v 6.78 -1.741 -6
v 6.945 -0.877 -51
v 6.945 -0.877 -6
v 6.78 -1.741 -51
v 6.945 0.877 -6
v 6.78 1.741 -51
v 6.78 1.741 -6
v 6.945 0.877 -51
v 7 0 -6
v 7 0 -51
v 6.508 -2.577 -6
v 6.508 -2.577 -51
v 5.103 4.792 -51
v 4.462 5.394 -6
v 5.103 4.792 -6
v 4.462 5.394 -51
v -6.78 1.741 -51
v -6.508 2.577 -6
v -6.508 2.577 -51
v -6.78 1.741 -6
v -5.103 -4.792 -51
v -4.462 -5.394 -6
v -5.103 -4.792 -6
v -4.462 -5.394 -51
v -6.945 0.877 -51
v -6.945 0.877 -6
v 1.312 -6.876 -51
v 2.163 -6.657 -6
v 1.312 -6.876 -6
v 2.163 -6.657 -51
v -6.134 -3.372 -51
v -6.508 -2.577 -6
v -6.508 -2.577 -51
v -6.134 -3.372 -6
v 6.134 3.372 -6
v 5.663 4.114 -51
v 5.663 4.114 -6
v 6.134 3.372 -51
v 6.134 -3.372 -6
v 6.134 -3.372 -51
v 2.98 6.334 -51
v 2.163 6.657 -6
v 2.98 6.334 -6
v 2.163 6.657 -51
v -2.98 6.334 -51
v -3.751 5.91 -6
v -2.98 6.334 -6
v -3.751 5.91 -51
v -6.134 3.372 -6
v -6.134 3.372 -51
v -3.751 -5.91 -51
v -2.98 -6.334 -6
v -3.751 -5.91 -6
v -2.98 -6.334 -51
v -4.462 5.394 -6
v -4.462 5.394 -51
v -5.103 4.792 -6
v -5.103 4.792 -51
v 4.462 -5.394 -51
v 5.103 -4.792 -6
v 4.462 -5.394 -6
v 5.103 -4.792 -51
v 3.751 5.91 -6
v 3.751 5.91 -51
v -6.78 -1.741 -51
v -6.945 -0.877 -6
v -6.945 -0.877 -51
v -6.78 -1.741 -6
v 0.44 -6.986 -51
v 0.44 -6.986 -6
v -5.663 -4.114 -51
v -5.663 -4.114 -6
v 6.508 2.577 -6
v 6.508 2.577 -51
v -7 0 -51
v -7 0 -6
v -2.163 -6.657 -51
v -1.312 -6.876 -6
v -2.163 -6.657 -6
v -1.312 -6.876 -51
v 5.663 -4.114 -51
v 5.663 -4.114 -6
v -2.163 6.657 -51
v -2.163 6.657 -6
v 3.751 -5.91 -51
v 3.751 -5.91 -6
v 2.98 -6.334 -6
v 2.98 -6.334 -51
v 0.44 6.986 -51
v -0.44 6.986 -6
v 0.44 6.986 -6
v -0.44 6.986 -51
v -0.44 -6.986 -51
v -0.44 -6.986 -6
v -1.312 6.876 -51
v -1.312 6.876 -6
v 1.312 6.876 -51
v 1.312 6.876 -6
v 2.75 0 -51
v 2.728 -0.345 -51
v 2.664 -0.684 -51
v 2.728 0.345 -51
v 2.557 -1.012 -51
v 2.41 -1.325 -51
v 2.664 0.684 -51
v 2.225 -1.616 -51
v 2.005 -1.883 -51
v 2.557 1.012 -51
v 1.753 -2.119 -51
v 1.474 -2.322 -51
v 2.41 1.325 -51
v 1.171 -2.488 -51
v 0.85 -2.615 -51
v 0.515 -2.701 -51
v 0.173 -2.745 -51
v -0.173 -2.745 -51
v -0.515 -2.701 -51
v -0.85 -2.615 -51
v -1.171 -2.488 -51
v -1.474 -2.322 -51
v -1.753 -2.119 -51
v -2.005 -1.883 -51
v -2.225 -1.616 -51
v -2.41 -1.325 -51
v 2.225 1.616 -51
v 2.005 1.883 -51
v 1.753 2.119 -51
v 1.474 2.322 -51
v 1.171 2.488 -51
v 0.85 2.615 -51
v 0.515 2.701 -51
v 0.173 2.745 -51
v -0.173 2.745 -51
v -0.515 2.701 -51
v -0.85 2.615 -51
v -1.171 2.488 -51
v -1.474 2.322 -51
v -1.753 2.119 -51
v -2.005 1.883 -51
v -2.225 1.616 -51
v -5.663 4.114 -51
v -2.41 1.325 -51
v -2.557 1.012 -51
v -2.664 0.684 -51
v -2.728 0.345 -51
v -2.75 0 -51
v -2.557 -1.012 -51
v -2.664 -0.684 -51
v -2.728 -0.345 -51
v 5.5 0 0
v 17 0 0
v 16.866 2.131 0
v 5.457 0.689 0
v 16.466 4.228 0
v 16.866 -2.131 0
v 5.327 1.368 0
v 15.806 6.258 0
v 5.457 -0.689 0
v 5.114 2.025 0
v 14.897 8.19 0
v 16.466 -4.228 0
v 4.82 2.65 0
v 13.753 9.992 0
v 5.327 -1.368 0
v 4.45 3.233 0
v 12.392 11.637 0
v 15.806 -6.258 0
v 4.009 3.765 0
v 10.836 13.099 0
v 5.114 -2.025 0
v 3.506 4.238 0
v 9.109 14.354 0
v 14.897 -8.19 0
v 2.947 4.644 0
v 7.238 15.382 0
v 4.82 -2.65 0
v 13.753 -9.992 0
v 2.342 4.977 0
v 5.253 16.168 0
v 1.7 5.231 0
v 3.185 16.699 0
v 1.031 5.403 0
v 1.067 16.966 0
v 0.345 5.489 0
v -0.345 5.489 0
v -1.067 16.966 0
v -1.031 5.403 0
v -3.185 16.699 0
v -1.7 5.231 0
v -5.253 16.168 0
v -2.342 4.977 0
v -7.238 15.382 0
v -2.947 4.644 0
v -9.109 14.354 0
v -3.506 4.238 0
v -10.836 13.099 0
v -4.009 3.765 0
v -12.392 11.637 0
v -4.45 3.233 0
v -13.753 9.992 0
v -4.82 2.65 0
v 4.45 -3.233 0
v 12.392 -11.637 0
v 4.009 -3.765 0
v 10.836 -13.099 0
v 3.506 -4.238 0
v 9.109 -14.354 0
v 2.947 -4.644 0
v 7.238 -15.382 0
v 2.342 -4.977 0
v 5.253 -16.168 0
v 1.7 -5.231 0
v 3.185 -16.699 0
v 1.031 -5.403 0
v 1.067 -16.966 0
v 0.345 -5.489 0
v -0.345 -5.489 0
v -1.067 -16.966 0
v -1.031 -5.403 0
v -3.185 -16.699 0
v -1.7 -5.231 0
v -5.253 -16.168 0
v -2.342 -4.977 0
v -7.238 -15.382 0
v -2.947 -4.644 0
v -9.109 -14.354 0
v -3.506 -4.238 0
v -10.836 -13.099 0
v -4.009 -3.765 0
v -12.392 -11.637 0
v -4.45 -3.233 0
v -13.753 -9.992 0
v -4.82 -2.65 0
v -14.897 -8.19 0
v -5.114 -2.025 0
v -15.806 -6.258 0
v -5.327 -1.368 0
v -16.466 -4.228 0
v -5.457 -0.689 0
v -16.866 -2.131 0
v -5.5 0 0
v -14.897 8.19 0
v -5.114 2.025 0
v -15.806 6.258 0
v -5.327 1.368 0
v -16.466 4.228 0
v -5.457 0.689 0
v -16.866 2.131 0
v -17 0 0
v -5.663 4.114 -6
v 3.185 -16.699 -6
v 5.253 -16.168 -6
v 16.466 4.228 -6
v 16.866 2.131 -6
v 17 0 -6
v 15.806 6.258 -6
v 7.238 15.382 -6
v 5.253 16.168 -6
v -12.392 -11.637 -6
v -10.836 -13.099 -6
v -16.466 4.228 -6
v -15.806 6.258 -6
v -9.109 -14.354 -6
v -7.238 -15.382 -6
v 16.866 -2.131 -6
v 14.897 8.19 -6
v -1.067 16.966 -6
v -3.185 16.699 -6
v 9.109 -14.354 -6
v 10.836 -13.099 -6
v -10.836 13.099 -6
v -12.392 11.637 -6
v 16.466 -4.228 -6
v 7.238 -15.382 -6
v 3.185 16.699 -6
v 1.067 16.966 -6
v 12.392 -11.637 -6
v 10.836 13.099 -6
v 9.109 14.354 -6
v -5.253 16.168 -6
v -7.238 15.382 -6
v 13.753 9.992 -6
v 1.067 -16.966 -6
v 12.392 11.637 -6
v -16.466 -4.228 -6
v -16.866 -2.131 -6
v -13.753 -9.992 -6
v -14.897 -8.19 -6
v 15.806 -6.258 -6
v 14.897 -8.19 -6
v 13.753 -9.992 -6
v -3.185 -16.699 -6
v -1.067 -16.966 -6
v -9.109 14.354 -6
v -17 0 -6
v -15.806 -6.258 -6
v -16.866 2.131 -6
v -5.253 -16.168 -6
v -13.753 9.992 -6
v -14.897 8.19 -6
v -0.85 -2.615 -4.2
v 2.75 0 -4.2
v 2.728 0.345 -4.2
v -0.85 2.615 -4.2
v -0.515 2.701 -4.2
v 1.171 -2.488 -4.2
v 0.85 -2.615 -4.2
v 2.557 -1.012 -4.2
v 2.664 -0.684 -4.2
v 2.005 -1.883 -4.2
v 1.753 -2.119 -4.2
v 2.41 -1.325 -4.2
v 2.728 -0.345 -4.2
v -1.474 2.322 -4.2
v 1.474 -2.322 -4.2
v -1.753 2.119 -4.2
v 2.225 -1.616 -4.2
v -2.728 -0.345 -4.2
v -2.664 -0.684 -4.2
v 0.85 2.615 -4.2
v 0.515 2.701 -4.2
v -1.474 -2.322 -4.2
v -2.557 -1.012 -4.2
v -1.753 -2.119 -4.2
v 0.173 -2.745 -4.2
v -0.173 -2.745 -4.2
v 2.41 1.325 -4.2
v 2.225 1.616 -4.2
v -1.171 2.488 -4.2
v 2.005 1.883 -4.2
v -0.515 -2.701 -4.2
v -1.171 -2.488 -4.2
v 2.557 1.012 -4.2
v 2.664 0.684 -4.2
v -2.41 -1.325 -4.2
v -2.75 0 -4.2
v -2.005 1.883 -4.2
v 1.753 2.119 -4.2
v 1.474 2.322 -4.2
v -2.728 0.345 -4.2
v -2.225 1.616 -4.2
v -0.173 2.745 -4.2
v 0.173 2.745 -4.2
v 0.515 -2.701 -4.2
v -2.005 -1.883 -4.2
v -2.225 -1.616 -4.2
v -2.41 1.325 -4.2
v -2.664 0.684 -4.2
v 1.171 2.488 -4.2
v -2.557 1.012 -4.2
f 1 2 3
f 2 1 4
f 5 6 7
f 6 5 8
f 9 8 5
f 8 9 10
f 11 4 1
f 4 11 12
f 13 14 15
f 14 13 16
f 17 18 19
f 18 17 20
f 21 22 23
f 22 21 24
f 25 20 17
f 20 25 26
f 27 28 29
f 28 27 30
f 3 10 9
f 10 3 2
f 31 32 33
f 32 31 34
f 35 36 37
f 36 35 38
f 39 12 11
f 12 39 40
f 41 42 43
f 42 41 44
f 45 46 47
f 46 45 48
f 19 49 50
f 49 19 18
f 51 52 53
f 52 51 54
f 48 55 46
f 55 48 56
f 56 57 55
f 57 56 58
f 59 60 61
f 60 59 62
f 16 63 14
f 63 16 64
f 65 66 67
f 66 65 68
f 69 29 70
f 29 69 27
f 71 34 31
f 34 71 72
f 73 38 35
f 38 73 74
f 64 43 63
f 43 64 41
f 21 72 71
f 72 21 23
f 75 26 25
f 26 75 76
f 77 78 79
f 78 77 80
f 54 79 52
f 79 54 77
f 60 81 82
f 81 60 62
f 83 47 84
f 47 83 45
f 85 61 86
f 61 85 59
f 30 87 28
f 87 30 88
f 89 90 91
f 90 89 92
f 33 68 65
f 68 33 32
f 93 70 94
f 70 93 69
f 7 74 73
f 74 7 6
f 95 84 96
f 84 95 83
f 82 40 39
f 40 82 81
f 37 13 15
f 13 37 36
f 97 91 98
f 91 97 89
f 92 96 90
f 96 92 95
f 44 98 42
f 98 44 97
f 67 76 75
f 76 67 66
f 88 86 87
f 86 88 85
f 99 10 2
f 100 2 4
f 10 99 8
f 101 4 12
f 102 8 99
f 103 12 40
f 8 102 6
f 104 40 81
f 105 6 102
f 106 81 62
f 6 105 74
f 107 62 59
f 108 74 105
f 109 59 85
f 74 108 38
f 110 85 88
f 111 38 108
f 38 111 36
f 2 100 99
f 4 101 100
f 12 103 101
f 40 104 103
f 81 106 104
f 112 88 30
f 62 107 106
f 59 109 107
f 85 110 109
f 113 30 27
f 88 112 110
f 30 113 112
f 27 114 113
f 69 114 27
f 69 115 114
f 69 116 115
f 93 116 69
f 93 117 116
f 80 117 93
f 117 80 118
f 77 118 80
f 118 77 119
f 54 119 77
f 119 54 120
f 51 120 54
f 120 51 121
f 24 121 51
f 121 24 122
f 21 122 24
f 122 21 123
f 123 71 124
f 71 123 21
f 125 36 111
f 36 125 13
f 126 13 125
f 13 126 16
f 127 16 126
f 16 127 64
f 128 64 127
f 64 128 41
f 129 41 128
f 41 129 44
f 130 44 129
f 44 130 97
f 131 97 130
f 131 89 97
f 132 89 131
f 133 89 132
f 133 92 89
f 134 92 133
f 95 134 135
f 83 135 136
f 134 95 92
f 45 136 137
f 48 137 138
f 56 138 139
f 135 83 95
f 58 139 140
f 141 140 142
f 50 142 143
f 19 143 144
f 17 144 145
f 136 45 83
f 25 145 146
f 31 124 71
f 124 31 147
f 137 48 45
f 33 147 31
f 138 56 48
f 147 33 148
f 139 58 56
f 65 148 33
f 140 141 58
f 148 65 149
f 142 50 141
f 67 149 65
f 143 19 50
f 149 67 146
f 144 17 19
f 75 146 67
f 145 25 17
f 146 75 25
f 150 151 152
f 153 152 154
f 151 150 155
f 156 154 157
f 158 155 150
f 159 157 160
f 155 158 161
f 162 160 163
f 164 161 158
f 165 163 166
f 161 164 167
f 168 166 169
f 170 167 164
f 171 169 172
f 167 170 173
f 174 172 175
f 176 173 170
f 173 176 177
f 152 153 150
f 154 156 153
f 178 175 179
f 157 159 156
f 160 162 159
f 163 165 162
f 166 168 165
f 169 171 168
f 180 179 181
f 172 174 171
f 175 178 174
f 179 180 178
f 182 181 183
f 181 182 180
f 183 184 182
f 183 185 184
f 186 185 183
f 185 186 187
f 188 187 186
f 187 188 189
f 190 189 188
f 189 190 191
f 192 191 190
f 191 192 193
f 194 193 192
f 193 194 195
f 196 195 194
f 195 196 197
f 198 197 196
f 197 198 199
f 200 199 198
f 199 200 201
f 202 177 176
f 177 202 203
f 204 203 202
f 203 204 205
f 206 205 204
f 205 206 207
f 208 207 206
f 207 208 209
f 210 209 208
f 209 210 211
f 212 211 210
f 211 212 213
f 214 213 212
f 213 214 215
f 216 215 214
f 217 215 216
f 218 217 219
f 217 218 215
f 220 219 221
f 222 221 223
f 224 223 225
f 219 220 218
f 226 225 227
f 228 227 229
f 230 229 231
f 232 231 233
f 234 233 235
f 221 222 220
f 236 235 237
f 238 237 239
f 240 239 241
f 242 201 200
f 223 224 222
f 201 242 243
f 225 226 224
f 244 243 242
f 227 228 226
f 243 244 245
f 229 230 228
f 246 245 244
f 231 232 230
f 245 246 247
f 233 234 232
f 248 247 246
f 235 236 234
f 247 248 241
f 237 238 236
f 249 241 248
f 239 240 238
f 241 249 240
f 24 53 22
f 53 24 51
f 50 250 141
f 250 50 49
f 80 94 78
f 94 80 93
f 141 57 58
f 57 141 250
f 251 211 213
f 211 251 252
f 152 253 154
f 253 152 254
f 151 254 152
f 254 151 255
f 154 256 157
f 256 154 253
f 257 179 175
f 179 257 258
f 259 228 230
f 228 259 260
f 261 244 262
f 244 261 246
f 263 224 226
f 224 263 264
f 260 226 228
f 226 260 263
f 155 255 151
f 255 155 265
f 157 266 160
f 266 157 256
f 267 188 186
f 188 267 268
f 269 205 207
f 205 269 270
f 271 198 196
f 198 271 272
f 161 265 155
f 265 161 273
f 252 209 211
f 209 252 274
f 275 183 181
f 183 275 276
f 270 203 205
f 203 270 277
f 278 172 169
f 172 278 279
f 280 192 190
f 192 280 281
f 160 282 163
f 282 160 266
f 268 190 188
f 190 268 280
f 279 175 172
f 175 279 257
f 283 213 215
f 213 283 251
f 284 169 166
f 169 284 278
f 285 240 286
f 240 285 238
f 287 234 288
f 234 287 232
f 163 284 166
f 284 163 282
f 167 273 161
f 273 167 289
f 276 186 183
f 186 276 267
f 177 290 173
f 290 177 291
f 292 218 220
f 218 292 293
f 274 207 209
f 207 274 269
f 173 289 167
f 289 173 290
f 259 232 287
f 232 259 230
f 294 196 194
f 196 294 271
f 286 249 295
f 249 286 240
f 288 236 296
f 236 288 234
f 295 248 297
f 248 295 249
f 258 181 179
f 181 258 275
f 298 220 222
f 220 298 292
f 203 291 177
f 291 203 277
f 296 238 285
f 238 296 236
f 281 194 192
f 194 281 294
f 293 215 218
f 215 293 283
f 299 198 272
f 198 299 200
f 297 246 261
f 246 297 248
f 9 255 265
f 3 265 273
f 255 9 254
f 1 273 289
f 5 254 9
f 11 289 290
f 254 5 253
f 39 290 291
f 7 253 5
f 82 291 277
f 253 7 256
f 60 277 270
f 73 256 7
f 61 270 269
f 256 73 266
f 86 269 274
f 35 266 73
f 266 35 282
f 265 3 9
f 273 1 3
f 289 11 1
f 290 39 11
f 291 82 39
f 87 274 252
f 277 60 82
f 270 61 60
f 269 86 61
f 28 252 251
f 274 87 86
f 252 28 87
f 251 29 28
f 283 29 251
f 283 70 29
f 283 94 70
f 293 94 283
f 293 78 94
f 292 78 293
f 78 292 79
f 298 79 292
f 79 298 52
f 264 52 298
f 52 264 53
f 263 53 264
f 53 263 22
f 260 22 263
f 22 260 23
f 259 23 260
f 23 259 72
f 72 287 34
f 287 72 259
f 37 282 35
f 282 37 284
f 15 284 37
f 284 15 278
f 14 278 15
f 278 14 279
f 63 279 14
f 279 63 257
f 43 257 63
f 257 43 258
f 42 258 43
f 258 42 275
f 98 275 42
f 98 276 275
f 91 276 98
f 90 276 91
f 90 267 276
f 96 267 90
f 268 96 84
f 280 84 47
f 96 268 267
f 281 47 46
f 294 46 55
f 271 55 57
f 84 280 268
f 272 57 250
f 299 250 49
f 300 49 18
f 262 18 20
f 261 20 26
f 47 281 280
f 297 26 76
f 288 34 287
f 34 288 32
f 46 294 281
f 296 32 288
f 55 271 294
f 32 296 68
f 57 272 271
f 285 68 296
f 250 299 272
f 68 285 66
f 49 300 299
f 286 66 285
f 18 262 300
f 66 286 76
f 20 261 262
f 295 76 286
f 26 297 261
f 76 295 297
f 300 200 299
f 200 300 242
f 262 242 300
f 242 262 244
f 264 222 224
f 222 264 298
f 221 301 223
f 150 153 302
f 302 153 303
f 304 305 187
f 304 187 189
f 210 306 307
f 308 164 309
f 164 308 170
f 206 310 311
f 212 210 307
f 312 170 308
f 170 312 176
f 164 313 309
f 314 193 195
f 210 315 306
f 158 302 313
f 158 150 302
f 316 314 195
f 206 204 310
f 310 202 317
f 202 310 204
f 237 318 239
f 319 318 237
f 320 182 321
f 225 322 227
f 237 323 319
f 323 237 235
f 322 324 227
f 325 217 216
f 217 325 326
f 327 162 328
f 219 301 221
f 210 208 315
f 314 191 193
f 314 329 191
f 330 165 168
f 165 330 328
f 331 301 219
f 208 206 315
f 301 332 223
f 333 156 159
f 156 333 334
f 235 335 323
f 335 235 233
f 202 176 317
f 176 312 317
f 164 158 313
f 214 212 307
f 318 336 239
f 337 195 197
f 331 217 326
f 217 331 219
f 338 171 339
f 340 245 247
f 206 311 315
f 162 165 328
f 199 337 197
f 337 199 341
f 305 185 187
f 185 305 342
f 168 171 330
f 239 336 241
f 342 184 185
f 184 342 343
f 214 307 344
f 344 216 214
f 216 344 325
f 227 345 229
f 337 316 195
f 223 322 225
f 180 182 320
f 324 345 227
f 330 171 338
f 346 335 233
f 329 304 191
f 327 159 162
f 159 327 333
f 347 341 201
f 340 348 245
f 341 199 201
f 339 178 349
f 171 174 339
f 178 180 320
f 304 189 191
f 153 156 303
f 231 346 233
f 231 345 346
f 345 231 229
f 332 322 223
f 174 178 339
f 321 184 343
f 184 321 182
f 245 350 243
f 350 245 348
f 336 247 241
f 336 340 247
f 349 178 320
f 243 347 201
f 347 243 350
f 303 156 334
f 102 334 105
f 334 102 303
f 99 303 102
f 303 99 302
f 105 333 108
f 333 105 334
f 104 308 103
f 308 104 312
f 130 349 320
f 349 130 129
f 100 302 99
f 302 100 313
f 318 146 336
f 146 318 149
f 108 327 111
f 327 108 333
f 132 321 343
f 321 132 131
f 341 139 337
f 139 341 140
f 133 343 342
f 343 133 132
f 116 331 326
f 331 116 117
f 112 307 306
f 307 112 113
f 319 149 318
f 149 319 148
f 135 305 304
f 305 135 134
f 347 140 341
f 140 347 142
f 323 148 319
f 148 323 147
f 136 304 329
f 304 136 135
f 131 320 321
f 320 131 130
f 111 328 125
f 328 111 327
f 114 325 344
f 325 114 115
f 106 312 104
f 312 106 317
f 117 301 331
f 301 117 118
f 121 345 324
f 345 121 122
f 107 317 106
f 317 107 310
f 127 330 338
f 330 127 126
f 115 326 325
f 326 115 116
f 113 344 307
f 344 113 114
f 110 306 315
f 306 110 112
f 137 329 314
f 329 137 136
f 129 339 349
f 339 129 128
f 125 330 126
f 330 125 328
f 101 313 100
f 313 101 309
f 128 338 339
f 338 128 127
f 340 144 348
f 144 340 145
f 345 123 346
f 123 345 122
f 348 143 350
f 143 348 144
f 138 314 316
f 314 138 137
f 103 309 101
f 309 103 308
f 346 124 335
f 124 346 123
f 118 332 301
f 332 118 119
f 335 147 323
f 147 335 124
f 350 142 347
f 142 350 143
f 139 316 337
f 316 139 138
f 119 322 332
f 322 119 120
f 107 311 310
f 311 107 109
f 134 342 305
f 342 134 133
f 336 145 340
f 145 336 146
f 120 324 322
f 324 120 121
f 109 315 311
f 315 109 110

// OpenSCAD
$fn = 50;


difference() {
	union() {
		translate(v = [0, 0, -51.0000000000]) {
			cylinder(h = 51, r = 7.0000000000);
		}
		translate(v = [0, 0, -6.0000000000]) {
			cylinder(h = 6, r = 17.0000000000);
		}
	}
	union() {
		translate(v = [0, 0, 0]) {
			rotate(a = [0, 0, 0]) {
				difference() {
					union() {
						#translate(v = [0, 0, -51.0000000000]) {
							cylinder(h = 51, r = 2.2500000000);
						}
						#translate(v = [0, 0, -4.2000000000]) {
							cylinder(h = 4.2000000000, r1 = 2.7500000000, r2 = 5.5000000000);
						}
						#translate(v = [0, 0, -51.0000000000]) {
							cylinder(h = 51, r = 2.7500000000);
						}
						#translate(v = [0, 0, -51.0000000000]) {
							cylinder(h = 51, r = 2.2500000000);
						}
					}
					union();
				}
			}
		}
	}
}
